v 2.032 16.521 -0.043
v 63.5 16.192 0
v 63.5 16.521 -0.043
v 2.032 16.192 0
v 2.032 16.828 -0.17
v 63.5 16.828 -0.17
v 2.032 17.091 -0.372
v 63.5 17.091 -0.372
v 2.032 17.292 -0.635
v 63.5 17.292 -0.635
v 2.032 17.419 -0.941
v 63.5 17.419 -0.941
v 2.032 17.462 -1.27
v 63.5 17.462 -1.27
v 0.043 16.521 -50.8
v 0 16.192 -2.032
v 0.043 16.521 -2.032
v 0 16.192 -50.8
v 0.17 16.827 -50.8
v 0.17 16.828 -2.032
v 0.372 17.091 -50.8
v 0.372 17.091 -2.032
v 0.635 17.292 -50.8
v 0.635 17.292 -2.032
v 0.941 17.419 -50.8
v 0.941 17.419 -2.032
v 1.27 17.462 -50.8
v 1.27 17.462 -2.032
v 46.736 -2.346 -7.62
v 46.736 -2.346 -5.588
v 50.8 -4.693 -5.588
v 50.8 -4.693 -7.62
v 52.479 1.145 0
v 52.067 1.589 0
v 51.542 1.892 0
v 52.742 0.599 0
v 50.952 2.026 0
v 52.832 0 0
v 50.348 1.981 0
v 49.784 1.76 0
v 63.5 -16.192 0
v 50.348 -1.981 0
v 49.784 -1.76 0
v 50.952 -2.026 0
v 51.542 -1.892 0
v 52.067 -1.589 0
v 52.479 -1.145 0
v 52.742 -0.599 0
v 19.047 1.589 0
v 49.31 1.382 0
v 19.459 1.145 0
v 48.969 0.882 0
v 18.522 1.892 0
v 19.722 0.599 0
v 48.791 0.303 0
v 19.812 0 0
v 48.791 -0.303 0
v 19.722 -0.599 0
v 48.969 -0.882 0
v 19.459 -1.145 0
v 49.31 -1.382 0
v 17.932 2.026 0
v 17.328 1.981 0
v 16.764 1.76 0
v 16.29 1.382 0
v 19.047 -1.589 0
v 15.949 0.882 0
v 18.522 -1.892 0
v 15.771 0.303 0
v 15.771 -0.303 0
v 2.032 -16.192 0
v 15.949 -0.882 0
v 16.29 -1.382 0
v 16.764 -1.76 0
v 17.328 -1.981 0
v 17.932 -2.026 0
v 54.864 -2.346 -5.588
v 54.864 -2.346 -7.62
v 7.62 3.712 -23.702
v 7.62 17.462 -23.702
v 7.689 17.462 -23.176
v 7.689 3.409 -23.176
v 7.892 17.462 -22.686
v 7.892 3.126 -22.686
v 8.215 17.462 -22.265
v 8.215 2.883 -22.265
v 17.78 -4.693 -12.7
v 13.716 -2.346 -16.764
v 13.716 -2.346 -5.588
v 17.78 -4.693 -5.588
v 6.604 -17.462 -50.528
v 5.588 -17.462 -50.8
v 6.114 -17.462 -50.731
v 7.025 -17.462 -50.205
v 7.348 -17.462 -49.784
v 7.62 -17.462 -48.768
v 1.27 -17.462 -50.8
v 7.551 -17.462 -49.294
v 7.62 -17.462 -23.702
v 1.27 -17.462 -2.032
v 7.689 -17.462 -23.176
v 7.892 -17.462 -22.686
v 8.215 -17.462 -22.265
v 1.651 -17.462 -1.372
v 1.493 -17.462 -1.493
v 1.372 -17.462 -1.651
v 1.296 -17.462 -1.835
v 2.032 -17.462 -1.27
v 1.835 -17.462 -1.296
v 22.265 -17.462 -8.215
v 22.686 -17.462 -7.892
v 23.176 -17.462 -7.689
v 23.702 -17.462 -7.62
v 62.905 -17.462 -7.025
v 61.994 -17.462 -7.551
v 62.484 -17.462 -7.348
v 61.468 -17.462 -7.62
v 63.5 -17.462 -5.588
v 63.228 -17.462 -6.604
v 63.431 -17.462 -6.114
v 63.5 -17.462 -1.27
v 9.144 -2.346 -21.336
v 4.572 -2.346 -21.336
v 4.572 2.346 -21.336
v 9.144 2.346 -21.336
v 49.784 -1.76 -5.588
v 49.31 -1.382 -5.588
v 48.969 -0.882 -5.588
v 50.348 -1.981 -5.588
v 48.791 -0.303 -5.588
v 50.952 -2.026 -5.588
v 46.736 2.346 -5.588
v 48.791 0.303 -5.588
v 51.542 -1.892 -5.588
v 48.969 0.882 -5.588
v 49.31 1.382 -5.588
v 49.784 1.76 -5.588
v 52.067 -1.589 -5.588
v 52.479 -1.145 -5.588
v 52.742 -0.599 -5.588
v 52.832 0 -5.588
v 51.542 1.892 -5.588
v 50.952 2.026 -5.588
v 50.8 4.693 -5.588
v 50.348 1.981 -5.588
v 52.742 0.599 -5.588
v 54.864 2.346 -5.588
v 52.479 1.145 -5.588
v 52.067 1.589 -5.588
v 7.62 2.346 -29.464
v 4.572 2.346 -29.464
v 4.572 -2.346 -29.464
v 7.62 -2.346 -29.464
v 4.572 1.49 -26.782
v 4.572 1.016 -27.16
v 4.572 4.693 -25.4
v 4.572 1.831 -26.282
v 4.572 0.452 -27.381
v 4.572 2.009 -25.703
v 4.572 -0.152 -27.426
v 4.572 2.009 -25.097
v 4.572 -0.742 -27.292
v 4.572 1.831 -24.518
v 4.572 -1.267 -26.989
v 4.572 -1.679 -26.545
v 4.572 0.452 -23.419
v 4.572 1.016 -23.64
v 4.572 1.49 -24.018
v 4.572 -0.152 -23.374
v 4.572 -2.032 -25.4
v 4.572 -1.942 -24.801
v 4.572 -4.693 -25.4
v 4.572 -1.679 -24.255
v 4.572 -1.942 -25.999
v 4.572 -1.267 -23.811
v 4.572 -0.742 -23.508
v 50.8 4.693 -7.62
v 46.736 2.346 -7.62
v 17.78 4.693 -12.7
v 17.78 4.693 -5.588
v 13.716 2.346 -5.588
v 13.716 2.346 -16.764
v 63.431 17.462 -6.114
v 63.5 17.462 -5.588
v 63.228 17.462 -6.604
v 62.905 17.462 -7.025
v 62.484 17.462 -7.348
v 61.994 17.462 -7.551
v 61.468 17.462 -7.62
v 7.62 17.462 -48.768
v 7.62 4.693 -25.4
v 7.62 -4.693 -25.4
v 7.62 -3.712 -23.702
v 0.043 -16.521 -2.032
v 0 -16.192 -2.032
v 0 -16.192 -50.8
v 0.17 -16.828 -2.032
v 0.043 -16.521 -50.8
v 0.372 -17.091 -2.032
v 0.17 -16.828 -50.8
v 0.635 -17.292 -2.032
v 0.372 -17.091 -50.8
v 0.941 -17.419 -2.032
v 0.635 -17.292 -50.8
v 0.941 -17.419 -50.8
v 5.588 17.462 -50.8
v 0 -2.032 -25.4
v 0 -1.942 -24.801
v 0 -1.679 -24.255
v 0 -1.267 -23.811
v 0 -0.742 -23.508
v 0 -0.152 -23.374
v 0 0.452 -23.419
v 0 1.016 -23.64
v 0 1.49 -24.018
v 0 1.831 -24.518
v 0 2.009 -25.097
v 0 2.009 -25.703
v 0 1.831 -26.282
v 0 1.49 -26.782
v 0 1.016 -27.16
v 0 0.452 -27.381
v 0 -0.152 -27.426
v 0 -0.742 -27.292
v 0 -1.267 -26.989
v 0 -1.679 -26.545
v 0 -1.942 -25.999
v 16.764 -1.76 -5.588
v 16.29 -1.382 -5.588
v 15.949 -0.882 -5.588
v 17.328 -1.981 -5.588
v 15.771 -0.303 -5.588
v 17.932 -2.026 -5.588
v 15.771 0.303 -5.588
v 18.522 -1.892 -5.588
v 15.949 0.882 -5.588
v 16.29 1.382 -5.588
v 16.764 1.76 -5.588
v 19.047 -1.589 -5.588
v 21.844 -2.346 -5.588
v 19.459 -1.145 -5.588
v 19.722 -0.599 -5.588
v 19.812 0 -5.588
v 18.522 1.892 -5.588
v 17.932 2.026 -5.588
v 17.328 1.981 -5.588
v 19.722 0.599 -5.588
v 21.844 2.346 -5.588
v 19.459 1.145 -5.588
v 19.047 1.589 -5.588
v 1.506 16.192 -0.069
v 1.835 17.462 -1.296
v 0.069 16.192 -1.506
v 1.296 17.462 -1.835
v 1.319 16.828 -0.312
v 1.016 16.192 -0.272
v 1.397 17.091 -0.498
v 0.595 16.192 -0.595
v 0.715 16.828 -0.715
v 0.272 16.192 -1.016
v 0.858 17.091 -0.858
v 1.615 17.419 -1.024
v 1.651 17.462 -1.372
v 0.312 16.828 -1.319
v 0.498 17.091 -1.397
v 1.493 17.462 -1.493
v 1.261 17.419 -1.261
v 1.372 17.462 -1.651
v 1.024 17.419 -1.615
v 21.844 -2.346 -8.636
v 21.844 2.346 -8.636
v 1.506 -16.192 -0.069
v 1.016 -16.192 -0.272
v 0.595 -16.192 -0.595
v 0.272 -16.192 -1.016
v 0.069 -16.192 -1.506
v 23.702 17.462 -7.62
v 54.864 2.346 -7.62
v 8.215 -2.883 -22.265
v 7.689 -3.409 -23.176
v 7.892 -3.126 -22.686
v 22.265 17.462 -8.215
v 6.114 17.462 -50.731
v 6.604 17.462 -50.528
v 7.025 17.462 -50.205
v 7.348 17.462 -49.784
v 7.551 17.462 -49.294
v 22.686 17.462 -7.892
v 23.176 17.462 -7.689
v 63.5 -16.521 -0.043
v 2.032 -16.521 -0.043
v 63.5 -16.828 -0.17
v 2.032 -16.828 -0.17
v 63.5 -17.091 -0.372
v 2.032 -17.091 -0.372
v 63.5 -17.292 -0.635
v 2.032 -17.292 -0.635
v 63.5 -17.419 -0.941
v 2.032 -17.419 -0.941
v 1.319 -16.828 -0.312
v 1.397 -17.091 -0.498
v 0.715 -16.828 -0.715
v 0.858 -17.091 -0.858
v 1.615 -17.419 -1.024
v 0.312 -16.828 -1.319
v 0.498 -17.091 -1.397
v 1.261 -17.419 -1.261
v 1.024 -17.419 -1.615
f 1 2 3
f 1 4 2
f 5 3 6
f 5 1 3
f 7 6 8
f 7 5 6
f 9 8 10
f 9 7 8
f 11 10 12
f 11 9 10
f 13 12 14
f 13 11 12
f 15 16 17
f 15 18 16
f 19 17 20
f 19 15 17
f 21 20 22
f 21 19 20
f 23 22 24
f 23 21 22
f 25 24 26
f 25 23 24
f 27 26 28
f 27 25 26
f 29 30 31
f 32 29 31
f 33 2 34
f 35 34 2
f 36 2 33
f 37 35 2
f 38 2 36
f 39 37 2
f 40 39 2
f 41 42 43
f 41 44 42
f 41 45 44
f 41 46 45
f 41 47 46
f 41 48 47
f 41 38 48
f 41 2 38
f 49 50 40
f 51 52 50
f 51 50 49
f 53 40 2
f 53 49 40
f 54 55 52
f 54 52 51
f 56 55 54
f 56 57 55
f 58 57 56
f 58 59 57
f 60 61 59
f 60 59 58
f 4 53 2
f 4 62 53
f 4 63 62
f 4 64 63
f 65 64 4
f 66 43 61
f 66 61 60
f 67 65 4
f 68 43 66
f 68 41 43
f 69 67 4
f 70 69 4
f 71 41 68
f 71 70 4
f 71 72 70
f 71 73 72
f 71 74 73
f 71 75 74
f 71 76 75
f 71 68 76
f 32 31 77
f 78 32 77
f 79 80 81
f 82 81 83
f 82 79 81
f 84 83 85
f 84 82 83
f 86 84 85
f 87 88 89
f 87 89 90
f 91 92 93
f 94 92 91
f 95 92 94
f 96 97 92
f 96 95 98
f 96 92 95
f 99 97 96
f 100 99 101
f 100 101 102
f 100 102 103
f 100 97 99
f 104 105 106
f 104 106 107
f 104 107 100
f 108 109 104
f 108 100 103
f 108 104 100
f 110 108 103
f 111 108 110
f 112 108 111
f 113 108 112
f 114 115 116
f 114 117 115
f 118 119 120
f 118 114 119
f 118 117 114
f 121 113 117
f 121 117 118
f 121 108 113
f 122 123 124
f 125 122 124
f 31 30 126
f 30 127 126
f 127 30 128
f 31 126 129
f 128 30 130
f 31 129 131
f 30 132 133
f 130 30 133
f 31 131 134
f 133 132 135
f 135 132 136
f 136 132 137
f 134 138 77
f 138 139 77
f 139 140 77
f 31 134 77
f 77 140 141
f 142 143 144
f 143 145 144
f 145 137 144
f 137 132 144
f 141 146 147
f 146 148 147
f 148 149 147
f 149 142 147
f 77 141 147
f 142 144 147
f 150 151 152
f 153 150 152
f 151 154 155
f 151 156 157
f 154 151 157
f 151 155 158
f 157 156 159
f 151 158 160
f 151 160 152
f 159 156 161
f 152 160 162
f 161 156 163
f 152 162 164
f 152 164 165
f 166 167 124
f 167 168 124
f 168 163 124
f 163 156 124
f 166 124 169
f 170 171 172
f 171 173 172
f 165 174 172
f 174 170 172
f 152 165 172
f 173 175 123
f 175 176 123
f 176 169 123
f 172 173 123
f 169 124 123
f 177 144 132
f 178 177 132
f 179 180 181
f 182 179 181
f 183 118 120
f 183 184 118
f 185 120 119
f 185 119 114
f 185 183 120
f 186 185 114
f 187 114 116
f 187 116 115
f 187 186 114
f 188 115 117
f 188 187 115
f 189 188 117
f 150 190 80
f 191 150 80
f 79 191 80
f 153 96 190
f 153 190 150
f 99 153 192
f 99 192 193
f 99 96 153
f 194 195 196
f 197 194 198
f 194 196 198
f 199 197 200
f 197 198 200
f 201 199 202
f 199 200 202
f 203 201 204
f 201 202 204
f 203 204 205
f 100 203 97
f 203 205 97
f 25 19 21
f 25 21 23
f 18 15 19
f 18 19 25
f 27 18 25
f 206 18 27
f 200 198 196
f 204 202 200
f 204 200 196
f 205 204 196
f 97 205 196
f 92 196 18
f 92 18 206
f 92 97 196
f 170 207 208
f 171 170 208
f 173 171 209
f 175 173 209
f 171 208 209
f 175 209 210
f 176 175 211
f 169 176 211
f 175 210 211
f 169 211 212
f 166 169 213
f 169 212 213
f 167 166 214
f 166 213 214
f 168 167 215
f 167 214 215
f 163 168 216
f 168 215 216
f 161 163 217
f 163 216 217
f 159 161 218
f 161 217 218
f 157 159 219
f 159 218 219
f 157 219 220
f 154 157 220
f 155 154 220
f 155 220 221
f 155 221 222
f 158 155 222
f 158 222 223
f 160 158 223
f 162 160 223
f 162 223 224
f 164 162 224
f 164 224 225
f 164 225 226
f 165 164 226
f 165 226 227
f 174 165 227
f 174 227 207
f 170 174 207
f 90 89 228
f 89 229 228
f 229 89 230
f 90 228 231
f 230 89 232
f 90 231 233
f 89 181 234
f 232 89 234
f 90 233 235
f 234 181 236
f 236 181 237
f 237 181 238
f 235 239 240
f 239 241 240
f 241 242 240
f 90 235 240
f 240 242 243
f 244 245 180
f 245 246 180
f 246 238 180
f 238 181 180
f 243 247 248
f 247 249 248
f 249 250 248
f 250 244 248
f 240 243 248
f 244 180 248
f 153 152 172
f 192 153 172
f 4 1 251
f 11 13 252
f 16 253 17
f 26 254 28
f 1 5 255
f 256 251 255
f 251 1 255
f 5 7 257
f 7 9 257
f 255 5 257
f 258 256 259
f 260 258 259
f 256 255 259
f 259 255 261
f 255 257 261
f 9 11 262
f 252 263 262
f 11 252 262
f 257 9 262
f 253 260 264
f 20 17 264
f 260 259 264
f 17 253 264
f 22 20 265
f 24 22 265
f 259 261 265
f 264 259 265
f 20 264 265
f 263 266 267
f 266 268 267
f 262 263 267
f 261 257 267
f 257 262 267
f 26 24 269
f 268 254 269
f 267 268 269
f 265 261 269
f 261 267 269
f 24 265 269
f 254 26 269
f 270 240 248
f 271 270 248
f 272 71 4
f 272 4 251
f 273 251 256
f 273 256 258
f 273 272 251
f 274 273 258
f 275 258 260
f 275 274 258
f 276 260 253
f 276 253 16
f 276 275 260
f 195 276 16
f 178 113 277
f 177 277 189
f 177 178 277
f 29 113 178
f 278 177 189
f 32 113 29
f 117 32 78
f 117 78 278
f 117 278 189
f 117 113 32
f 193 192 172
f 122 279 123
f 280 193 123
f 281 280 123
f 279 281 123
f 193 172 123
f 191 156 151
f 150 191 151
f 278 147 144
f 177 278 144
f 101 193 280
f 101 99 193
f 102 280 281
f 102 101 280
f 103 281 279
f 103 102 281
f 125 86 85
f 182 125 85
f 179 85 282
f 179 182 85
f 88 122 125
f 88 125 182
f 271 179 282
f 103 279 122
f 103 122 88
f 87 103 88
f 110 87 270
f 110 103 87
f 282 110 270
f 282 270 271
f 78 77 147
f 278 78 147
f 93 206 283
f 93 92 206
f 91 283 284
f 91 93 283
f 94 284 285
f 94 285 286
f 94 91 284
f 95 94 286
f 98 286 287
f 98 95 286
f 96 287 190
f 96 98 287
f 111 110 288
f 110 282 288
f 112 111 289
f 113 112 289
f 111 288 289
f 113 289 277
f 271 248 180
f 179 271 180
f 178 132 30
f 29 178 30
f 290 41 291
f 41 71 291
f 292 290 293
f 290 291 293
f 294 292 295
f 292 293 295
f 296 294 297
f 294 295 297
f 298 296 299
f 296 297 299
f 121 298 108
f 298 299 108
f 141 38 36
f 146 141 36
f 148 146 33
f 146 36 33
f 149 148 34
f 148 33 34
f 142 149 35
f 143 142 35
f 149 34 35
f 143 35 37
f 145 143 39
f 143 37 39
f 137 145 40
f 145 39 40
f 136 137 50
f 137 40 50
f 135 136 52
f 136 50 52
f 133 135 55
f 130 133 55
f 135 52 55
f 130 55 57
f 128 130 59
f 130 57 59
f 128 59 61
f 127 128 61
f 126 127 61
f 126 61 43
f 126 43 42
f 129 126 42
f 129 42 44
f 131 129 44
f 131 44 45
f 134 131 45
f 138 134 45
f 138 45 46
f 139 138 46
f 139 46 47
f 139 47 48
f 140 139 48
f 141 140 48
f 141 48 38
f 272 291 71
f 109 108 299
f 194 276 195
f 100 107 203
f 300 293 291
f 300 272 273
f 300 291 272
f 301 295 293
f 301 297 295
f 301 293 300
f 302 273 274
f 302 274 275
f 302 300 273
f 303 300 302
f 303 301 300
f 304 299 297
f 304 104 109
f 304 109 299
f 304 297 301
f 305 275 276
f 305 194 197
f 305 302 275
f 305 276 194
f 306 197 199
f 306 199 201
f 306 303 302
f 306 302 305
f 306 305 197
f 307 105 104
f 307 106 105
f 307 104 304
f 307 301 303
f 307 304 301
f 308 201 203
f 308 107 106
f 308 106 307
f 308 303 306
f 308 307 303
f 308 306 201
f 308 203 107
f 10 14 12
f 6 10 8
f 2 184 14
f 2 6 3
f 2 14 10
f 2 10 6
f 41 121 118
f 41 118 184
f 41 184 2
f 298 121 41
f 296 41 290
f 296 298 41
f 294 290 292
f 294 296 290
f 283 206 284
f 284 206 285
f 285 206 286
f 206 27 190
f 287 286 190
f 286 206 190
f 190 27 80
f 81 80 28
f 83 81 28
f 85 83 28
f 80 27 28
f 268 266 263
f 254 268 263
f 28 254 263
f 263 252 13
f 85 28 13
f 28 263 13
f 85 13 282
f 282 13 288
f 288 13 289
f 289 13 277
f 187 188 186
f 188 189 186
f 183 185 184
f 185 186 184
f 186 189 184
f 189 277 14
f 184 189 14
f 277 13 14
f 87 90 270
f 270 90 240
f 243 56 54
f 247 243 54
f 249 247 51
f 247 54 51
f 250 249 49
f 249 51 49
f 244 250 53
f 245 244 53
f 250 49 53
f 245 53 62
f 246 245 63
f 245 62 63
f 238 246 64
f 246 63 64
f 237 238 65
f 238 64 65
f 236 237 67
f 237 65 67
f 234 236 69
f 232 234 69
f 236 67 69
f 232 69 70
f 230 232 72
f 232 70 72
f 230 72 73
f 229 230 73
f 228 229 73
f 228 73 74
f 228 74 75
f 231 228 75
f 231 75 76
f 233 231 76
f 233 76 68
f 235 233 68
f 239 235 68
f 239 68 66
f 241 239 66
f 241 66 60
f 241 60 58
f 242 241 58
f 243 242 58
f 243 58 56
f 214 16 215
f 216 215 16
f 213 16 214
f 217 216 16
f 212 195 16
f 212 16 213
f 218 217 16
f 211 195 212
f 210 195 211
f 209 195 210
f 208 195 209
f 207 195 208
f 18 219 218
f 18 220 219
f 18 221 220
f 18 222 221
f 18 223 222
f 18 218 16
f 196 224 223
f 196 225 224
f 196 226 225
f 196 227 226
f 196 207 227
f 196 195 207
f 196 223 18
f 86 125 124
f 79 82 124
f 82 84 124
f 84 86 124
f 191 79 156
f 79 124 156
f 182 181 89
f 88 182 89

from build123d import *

# Parameters (mm, degrees)
F1_DEPTH = 17.4625
F2_R     = 2.032
F4_DEPTH = 25.4
F5_START = -5.588
F5_DEPTH = 19.812
F3_R     = 2.032
F6_DEPTH = 25.4
F7_START = -4.572
F7_DEPTH = 20.828
F8_R     = 2.032
F9_R     = 1.27


with BuildPart() as f1:
    # F0 (on Front) → F1 (new body, symmetric)
    with BuildSketch(Plane.XZ):
        Polygon((63.5, 0), (0, 0), (0, -50.8), (7.62, -50.8), (7.62, -22.86), (22.86, -7.62), (63.5, -7.62), align=None)
    extrude(amount=F1_DEPTH, both=True)

    # F2 (on face) → F4 (cut)
    with BuildSketch(Plane.XY):
        with Locations((17.78, 0)):
            Circle(F2_R)
        with Locations((50.8, 0)):
            Circle(F2_R)
    extrude(amount=-F4_DEPTH, mode=Mode.SUBTRACT)

    # F2 (on face) → F5 (cut)
    with BuildSketch(Plane.XY.offset(F5_START)):
        Polygon((21.844, 2.346351494), (17.78, 4.692702988), (13.716, 2.346351494), (13.716, -2.346351494), (17.78, -4.692702988), (21.844, -2.346351494), align=None)
        with Locations((17.78, 0)):
            Circle(F2_R, mode=Mode.SUBTRACT)
        Polygon((54.864, 2.346351494), (50.8, 4.692702988), (46.736, 2.346351494), (46.736, -2.346351494), (50.8, -4.692702988), (54.864, -2.346351494), align=None)
        with Locations((50.8, 0)):
            Circle(F2_R, mode=Mode.SUBTRACT)
    extrude(amount=-F5_DEPTH, mode=Mode.SUBTRACT)

    # F3 (on face) → F6 (cut)
    with BuildSketch(Plane(origin=(0, 0, 0), x_dir=(0, -1, 0), z_dir=(-1, 0, 0))):
        with Locations((0, -25.4)):
            Circle(F3_R)
    extrude(amount=-F6_DEPTH, mode=Mode.SUBTRACT)

    # F3 (on face) → F7 (cut)
    with BuildSketch(Plane(origin=(0, 0, 0), x_dir=(0, -1, 0), z_dir=(-1, 0, 0)).offset(F7_START)):
        Polygon((-2.346351494, -29.464), (2.346351494, -29.464), (4.692702988, -25.4), (2.346351494, -21.336), (-2.346351494, -21.336), (-4.692702988, -25.4), align=None)
        with Locations((0, -25.4)):
            Circle(F3_R, mode=Mode.SUBTRACT)
    extrude(amount=-F7_DEPTH, mode=Mode.SUBTRACT)

    # F8
    f8_edges = [f1.edges().sort_by_distance(p)[0] for p in [
        (63.5, 0, -7.62),
        (7.62, 0, -50.8),
        (7.62, -10.344367, -22.86),
        (7.62, 10.344367, -22.86),
        (22.86, 0, -7.62),
        (0, 0, 0),
    ]]
    fillet(f8_edges, radius=F8_R)

    # F9
    f9_edges = [f1.edges().sort_by_distance(p)[0] for p in [
        (32.766, -17.4625, 0),
        (32.766, 17.4625, 0),
    ]]
    fillet(f9_edges, radius=F9_R)


solid = f1.part
